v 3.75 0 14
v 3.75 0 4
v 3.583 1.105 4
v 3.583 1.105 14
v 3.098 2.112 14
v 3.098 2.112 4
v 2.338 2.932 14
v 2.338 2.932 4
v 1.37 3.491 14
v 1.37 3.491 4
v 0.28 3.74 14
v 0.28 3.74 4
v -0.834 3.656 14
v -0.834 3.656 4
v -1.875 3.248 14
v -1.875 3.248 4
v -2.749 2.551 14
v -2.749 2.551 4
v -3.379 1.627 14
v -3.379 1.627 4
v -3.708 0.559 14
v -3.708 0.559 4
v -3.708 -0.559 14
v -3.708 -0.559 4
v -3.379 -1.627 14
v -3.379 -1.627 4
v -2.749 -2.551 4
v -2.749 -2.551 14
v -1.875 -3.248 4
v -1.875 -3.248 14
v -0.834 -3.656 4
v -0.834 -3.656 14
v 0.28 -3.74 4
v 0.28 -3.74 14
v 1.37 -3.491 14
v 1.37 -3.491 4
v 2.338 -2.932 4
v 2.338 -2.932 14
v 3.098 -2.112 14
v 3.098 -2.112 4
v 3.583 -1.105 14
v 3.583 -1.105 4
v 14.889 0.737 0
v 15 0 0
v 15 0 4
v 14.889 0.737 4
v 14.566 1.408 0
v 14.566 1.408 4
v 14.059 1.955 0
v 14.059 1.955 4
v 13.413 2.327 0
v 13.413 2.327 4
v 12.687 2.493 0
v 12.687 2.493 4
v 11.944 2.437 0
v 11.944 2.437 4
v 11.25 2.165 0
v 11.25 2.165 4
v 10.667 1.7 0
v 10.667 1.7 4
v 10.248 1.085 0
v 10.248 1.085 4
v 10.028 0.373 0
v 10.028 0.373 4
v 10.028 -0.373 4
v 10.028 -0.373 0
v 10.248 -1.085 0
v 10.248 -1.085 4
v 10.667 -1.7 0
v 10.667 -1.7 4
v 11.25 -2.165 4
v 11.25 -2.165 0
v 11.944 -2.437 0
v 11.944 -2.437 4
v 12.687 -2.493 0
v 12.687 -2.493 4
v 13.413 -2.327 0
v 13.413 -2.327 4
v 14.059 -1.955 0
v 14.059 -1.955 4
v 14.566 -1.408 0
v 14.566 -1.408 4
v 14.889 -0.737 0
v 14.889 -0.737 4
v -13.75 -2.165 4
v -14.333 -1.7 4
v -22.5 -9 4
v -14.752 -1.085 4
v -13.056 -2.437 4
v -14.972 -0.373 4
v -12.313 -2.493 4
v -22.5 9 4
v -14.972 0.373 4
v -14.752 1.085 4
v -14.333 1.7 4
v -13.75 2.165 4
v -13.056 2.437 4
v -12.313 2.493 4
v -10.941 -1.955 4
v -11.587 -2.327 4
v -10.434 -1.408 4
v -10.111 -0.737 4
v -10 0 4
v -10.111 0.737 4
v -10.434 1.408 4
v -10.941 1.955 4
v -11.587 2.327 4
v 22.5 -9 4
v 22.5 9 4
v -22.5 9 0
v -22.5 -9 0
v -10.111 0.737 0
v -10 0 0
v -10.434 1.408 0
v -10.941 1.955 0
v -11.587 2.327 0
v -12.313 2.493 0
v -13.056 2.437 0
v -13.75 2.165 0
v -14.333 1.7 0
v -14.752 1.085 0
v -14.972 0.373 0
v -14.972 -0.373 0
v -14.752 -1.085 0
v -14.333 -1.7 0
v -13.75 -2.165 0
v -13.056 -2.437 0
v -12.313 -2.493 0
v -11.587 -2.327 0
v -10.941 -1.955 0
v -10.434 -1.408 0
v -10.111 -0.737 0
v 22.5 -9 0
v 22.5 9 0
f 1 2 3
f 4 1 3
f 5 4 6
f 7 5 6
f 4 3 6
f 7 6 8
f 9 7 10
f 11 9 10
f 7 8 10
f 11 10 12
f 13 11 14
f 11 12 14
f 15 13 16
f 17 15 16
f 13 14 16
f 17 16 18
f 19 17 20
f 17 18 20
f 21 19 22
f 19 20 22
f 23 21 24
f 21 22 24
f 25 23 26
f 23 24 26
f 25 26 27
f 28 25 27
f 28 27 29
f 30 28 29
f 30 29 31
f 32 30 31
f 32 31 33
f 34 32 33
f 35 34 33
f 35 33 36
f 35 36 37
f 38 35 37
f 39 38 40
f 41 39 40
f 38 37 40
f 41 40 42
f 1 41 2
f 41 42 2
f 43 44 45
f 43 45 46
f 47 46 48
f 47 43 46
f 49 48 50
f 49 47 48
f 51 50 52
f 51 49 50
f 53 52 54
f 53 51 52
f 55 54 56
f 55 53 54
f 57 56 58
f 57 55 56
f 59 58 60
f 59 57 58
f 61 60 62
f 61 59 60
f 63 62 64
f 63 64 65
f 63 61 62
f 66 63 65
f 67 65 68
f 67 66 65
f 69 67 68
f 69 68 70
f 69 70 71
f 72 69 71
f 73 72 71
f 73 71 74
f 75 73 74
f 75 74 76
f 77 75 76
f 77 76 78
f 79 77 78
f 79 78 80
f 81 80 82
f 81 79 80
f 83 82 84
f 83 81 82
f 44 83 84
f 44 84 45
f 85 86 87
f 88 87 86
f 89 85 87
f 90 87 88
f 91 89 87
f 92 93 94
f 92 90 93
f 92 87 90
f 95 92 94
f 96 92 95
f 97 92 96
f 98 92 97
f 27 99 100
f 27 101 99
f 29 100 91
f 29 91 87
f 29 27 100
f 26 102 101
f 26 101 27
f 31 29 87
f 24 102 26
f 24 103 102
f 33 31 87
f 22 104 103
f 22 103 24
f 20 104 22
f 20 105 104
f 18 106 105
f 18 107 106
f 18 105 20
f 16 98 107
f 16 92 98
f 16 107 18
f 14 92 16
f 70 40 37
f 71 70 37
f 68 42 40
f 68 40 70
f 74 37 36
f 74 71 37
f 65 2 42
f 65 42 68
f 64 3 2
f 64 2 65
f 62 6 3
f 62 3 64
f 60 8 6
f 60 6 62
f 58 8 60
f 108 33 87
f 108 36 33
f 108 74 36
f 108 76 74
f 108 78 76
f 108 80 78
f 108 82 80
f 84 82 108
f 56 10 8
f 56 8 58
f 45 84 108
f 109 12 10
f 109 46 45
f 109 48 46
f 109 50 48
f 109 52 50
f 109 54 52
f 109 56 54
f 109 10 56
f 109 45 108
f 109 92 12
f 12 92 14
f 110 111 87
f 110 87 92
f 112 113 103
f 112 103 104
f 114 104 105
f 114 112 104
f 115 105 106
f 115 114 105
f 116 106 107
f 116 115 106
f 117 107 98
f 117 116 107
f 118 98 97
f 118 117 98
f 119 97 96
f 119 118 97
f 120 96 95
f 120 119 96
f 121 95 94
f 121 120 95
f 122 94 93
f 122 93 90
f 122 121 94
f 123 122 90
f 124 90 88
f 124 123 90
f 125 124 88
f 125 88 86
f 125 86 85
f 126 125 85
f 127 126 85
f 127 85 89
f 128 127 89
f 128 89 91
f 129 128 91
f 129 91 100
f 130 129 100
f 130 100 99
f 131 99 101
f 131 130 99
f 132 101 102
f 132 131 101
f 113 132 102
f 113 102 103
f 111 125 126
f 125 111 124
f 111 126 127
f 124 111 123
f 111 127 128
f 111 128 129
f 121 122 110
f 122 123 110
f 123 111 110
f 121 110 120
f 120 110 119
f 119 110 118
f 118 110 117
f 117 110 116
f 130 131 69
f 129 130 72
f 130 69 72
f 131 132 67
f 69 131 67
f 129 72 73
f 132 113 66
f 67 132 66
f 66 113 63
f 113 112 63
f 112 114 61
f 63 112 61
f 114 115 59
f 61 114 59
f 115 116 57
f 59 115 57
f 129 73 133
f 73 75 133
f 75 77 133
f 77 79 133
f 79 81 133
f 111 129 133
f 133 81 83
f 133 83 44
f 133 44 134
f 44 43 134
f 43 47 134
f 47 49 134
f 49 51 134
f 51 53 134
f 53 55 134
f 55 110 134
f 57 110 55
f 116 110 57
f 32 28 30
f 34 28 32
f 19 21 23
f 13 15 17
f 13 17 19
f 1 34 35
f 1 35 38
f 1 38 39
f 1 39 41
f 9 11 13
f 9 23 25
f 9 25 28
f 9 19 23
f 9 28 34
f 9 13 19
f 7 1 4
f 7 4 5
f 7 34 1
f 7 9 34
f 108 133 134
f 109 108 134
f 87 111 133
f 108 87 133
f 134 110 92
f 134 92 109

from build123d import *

# Parameters (mm, degrees)
F0_W     = 45
F0_H     = 18
F0_R     = 2.5
F1_DEPTH = 4
F2_R     = 3.75
F3_DEPTH = 10


with BuildPart() as f1:
    # F0 (on Top) → F1 (new body)
    with BuildSketch(Plane.XY):
        Rectangle(F0_W, F0_H)
        with Locations((-12.5, 0)):
            Circle(F0_R, mode=Mode.SUBTRACT)
        with Locations((12.5, 0)):
            Circle(F0_R, mode=Mode.SUBTRACT)
    extrude(amount=F1_DEPTH)

    # F2 (on face) → F3 (join)
    with BuildSketch(Plane.XY.offset(4)):
        Circle(F2_R)
    extrude(amount=F3_DEPTH)


solid = f1.part
